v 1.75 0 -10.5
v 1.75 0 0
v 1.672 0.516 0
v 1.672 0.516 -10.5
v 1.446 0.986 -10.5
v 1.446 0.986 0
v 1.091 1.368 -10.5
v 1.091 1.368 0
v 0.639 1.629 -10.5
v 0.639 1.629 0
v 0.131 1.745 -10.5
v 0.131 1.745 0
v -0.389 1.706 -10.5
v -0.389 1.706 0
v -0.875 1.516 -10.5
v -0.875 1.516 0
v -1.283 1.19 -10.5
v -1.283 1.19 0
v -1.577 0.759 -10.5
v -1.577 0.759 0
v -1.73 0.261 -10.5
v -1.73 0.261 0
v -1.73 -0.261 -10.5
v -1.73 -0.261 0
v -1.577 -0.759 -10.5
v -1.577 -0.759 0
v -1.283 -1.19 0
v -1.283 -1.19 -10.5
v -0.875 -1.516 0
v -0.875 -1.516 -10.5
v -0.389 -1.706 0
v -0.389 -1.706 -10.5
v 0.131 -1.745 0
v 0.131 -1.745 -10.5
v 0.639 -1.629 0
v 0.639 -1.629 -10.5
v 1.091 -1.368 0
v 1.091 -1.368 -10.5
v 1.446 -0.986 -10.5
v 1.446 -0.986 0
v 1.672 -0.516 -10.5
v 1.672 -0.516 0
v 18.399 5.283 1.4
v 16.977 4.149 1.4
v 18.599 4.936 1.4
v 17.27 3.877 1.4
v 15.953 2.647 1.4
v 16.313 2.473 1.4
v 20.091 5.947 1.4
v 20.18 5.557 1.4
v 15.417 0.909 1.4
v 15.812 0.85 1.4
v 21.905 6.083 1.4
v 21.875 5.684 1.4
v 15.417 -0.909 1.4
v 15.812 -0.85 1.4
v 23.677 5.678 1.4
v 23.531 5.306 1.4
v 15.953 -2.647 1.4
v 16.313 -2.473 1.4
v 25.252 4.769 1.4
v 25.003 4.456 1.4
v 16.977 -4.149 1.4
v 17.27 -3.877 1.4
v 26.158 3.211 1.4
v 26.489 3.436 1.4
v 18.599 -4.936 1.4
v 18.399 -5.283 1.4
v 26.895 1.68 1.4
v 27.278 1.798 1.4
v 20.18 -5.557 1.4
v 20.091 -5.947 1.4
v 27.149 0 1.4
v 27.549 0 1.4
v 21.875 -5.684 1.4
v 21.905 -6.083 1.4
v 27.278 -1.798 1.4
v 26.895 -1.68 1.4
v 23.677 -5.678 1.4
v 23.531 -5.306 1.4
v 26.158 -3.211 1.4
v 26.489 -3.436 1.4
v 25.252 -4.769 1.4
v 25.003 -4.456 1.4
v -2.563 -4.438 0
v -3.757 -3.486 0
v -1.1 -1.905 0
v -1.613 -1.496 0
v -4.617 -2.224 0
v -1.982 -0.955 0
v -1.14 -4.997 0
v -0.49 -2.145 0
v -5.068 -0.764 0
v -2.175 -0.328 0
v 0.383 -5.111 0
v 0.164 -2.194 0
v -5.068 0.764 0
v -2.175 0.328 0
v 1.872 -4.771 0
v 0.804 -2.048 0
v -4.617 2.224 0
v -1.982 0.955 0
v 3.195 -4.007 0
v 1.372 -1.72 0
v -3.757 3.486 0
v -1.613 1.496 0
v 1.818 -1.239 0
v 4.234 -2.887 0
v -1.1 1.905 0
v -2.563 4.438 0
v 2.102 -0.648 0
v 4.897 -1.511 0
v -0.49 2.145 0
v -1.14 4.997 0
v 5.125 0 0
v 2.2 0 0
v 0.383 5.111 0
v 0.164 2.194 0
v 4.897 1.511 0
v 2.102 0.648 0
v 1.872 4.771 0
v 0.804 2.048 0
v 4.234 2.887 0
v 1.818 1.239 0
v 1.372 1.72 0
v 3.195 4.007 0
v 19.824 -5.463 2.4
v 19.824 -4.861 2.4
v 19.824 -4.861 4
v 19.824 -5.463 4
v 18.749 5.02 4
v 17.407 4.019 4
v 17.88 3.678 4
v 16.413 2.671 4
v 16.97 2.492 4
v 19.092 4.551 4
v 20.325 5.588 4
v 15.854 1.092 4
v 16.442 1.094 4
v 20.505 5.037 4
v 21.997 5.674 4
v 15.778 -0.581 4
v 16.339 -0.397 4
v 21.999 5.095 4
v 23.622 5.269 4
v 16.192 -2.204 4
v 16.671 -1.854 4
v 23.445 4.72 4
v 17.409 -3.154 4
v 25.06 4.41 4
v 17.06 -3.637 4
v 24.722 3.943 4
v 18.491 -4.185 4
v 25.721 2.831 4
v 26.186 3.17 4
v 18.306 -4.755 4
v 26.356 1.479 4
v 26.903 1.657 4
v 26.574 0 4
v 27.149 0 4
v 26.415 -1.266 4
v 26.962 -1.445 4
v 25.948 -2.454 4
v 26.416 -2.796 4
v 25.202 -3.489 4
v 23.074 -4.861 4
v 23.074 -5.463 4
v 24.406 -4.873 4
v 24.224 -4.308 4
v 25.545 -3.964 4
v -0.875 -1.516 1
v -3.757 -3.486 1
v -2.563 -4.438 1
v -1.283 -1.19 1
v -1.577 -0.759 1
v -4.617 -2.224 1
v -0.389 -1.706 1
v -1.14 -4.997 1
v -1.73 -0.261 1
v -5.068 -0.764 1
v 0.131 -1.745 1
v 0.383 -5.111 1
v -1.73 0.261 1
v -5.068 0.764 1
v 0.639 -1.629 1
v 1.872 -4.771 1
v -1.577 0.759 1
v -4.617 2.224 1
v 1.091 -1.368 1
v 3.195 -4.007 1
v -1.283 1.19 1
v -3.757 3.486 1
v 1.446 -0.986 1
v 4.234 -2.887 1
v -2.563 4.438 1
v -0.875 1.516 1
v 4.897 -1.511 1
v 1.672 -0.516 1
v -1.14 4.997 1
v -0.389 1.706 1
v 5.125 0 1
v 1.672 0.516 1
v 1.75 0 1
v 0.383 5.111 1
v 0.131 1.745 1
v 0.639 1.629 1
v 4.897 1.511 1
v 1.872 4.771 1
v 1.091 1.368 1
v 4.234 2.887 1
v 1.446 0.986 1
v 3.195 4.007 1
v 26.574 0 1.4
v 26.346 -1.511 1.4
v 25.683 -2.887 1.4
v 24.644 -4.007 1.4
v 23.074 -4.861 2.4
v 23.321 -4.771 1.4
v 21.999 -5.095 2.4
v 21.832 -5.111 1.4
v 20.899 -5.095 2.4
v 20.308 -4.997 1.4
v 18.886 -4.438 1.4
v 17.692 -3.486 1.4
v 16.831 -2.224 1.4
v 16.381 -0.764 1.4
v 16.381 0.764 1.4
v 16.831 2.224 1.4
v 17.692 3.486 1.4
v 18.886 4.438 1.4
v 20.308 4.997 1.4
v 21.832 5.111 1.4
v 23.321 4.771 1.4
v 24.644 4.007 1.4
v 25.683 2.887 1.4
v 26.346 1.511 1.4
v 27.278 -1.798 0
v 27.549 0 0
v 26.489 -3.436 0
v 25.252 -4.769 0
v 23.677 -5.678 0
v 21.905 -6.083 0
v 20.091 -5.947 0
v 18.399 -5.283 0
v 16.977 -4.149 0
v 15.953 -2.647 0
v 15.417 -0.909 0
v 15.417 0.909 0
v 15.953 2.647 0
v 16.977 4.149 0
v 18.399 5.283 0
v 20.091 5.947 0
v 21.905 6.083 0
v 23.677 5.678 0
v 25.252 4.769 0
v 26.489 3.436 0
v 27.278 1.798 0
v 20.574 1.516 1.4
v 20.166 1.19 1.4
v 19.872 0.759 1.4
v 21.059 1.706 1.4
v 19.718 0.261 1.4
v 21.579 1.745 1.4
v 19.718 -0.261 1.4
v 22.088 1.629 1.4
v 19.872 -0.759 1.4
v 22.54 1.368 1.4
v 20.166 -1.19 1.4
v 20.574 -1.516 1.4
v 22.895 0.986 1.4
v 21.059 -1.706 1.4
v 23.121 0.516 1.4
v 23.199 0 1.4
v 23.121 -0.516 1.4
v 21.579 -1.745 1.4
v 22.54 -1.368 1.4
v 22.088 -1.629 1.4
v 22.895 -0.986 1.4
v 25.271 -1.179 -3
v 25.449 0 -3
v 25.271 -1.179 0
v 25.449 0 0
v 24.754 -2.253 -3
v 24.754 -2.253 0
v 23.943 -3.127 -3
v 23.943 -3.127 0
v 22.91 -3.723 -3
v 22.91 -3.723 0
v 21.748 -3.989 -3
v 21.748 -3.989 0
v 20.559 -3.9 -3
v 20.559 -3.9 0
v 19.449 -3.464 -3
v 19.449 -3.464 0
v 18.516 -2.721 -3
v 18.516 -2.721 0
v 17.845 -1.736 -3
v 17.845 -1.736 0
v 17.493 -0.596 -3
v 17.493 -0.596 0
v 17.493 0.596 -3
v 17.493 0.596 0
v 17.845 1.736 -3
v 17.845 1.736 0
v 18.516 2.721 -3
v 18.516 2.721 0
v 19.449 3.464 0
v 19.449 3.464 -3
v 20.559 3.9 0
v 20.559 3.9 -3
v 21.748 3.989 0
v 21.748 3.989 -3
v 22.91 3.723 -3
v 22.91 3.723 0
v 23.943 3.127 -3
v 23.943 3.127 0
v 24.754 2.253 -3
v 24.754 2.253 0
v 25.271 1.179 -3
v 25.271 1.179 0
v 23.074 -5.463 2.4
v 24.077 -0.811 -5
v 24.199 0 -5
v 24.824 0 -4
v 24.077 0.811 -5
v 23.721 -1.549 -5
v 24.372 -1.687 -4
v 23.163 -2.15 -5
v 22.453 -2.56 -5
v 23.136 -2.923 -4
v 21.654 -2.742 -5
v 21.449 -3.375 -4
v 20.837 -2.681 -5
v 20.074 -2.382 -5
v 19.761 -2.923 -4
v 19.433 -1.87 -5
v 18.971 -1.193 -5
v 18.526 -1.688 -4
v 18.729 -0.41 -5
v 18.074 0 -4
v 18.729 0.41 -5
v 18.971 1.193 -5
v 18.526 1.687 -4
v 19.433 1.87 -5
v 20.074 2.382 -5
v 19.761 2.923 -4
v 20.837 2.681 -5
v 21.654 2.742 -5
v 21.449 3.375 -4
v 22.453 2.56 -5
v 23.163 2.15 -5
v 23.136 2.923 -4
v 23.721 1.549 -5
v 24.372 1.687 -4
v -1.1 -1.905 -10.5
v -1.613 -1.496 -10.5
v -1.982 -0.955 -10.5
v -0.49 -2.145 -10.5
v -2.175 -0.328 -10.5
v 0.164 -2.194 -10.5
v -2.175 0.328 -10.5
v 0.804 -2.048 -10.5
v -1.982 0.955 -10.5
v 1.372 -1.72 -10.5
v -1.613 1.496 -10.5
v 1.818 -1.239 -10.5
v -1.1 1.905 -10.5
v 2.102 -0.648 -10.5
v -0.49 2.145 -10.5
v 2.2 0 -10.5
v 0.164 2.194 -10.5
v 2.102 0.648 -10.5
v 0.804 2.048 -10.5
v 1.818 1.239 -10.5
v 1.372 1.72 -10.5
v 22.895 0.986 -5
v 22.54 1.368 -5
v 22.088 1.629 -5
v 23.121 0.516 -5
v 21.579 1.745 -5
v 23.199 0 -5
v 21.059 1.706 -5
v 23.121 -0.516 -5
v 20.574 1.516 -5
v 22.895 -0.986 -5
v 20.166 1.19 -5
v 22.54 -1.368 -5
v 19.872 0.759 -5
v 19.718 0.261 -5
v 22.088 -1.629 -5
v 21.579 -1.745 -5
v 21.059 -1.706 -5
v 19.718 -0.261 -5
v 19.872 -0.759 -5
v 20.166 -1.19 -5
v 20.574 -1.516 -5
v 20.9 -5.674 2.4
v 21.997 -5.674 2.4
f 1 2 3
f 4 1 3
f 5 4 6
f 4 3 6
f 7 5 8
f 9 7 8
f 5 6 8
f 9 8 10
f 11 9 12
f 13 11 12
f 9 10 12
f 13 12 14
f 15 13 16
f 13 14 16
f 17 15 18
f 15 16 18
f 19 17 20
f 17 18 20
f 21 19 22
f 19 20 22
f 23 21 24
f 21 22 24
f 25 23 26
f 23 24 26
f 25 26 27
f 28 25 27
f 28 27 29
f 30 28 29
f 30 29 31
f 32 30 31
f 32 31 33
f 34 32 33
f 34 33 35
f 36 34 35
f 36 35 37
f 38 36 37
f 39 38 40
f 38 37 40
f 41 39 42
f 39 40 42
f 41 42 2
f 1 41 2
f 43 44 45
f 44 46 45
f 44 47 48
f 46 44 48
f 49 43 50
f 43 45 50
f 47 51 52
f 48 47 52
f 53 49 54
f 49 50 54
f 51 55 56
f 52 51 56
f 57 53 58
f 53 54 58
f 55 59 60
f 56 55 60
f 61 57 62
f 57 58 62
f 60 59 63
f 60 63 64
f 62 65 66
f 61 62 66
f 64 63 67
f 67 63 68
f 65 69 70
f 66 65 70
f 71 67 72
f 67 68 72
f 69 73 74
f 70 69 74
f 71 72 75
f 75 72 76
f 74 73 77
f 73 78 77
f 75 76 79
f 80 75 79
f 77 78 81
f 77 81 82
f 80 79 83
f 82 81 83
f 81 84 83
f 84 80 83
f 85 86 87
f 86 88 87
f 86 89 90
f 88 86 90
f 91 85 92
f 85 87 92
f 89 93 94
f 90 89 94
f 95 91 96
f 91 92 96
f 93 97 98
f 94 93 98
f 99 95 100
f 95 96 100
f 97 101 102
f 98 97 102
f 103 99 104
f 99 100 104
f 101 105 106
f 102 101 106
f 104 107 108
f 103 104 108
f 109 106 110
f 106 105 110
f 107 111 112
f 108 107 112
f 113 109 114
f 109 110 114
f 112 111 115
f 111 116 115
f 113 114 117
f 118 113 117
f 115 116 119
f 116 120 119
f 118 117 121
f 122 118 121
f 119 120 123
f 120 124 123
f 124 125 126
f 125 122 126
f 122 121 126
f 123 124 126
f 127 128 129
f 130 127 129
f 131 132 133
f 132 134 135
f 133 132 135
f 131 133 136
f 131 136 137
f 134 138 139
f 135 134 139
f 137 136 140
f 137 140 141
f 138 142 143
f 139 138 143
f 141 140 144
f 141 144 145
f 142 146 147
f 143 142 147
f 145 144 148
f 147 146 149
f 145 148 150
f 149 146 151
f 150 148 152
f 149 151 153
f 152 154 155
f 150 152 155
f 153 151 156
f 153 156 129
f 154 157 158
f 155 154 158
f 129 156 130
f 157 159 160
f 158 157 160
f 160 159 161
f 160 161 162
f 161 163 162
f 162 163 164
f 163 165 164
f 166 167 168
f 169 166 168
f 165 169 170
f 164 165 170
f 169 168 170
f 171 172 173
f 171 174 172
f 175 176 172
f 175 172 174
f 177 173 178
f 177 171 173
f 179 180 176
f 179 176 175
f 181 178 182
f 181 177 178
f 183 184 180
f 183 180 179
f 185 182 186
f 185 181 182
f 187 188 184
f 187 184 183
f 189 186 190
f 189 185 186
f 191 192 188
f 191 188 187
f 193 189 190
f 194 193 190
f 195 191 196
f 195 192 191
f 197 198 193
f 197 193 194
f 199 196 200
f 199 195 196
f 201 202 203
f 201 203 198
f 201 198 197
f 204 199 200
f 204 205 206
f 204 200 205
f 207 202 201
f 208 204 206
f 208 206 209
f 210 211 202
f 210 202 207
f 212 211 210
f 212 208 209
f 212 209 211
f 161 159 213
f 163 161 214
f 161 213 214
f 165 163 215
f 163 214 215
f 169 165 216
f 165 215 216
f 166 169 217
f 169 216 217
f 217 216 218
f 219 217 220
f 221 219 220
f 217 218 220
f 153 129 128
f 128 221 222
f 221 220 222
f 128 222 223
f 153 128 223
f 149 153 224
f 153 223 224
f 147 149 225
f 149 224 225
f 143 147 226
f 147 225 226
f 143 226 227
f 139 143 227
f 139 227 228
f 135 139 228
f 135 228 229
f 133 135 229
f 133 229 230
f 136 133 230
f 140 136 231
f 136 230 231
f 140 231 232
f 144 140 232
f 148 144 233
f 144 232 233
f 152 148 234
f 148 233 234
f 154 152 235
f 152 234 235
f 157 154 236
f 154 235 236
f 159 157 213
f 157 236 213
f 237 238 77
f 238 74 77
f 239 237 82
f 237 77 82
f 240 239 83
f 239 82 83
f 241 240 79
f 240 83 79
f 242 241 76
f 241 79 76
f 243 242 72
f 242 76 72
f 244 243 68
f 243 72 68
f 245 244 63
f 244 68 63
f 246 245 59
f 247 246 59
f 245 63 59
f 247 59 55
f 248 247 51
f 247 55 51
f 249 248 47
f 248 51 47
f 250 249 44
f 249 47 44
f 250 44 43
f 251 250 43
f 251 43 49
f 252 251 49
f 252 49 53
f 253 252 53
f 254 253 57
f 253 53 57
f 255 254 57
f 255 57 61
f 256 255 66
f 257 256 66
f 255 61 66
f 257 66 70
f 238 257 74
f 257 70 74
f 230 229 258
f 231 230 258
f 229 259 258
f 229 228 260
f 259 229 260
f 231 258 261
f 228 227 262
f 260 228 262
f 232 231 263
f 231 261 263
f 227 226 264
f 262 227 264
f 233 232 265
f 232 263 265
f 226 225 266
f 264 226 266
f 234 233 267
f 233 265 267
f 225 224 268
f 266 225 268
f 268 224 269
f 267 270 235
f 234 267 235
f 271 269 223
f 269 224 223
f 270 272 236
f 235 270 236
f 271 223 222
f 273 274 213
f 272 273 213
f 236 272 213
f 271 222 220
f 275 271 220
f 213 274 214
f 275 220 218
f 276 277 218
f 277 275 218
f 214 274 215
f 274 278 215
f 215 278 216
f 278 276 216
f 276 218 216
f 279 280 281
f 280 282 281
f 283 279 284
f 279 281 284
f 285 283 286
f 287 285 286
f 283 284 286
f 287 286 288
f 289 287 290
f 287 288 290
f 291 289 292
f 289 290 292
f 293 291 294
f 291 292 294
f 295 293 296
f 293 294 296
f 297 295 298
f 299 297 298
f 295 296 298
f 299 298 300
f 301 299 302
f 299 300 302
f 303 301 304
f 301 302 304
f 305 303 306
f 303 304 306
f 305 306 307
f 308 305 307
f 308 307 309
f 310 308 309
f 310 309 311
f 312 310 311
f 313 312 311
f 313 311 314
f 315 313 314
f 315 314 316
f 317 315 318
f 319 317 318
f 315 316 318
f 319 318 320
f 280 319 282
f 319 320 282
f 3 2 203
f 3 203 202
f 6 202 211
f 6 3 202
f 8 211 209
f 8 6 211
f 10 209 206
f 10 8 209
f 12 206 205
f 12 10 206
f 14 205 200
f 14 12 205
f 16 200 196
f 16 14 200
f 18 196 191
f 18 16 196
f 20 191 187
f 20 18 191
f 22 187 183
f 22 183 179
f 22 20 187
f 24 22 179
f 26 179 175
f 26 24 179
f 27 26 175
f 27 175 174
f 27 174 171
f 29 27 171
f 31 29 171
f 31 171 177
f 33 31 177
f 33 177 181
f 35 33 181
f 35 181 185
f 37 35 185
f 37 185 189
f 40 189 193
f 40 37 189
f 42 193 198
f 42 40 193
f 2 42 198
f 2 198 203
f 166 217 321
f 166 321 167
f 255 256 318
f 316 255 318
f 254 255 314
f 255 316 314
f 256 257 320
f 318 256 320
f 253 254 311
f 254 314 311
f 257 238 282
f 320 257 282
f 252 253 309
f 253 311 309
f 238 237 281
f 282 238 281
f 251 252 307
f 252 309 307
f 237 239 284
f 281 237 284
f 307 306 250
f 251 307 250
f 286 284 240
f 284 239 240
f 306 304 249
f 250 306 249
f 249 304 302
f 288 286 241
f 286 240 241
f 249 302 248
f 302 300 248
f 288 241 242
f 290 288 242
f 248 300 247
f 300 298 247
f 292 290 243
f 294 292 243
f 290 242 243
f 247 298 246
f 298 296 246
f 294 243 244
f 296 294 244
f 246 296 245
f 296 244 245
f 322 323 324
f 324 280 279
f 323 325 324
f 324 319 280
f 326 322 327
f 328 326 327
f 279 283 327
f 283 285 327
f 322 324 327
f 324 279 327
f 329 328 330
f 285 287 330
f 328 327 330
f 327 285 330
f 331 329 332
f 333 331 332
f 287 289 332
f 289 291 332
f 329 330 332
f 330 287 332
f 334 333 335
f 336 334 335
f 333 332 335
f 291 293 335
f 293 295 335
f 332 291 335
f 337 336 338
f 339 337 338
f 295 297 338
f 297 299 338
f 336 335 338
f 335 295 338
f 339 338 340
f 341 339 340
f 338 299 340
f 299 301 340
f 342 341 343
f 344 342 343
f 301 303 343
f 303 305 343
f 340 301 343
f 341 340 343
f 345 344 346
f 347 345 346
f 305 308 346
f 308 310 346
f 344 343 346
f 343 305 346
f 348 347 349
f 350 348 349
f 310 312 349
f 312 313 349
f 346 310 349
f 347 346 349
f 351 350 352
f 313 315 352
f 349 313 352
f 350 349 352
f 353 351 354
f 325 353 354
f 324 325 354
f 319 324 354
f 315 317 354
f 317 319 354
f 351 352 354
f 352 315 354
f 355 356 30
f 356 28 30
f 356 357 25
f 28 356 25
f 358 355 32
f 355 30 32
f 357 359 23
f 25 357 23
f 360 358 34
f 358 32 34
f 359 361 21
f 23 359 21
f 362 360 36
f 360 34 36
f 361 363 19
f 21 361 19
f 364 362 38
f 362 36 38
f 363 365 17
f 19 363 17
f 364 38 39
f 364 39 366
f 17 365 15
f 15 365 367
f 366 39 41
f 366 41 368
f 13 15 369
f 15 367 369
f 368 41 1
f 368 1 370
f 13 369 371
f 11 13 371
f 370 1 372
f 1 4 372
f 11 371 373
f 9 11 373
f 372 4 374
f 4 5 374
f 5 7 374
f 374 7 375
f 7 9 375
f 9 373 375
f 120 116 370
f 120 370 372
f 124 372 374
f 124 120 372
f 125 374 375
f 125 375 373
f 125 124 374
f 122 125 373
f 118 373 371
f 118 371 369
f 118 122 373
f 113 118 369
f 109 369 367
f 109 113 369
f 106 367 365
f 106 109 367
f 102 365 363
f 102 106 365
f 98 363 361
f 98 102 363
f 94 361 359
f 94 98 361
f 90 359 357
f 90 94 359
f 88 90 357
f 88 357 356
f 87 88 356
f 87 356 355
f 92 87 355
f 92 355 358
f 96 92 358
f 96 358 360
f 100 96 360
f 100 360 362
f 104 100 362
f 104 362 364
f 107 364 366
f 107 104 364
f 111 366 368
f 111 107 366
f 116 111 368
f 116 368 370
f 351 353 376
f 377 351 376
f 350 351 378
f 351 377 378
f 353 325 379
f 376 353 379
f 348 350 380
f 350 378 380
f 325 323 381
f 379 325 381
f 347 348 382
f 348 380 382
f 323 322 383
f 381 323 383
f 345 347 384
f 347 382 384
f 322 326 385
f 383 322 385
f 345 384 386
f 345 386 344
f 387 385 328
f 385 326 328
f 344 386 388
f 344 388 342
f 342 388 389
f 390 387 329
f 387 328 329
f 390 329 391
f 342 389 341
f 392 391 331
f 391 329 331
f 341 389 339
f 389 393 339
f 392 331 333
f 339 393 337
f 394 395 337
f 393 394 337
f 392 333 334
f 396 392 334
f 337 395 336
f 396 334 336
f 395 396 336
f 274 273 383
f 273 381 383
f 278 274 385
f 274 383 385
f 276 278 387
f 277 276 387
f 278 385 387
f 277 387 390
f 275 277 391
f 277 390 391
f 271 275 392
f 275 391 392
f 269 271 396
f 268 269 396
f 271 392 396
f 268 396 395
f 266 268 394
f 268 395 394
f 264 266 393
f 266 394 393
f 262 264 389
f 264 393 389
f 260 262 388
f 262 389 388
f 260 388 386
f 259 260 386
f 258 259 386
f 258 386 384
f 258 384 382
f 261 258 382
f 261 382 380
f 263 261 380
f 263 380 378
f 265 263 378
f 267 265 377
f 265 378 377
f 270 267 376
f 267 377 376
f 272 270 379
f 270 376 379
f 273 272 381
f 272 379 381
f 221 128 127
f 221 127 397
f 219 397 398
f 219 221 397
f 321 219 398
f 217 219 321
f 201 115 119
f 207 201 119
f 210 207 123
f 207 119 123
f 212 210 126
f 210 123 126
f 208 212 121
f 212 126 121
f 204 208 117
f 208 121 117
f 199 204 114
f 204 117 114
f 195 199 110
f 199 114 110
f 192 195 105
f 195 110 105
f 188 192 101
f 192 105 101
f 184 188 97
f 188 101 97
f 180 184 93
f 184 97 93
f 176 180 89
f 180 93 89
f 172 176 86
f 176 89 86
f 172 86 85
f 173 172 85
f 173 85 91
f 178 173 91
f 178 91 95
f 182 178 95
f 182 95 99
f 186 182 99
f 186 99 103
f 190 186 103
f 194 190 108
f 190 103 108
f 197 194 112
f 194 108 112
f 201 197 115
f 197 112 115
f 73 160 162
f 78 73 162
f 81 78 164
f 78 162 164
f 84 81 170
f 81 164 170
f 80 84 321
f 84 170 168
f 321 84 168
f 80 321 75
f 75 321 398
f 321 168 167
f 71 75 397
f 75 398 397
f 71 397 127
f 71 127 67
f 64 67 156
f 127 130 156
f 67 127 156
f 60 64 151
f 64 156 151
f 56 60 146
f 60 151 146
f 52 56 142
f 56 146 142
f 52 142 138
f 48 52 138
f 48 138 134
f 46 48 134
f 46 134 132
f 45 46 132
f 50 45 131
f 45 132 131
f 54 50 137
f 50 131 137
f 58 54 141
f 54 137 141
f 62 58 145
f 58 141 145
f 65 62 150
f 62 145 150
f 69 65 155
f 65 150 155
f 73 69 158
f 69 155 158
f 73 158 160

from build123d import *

# Parameters (mm, degrees)
F0_R     = 5.125
F0_R_2   = 2.2
F0_R_3   = 1.75
F1_DEPTH = 1
F2_DEPTH = 10.5
F5_W     = 3.25
F5_H     = 1.6
F6_DEPTH = 6.101


with BuildPart() as f1:
    # F0 (on Top) → F1 (new body)
    with BuildSketch(Plane.XY):
        Circle(F0_R)
        Circle(F0_R_2, mode=Mode.SUBTRACT)
        Circle(F0_R_2)
        Circle(F0_R_3, mode=Mode.SUBTRACT)
    extrude(amount=F1_DEPTH)

    # F0 (on Top) → F2 (join)
    with BuildSketch(Plane.XY):
        Circle(F0_R_2)
        Circle(F0_R_3, mode=Mode.SUBTRACT)
    extrude(amount=-F2_DEPTH)


with BuildPart() as f4:
    # F3 (on Front) → F4 (revolve)
    with BuildSketch(Plane.XZ):
        Polygon((25.4486941695, -3), (25.4486941695, 0), (27.5486941695, 0), (27.5486941695, 1.4), (27.1486941695, 1.4), (27.1486941695, 4), (26.5736941695, 4), (26.5736941695, 1.4), (23.1986941695, 1.4), (23.1986941695, -5), (24.1986941695, -5), align=None)
    revolve(axis=Axis((21.4486941695, 0, -0.6741590851), (0, 0, -1)))

    # F5 (on Front) → F6 (cut, through all)
    with BuildSketch(Plane.XZ):
        with Locations((21.4486941695, 3.2)):
            Rectangle(F5_W, F5_H)
    extrude(amount=F6_DEPTH, mode=Mode.SUBTRACT)


solid = Compound([f1.part, f4.part])
